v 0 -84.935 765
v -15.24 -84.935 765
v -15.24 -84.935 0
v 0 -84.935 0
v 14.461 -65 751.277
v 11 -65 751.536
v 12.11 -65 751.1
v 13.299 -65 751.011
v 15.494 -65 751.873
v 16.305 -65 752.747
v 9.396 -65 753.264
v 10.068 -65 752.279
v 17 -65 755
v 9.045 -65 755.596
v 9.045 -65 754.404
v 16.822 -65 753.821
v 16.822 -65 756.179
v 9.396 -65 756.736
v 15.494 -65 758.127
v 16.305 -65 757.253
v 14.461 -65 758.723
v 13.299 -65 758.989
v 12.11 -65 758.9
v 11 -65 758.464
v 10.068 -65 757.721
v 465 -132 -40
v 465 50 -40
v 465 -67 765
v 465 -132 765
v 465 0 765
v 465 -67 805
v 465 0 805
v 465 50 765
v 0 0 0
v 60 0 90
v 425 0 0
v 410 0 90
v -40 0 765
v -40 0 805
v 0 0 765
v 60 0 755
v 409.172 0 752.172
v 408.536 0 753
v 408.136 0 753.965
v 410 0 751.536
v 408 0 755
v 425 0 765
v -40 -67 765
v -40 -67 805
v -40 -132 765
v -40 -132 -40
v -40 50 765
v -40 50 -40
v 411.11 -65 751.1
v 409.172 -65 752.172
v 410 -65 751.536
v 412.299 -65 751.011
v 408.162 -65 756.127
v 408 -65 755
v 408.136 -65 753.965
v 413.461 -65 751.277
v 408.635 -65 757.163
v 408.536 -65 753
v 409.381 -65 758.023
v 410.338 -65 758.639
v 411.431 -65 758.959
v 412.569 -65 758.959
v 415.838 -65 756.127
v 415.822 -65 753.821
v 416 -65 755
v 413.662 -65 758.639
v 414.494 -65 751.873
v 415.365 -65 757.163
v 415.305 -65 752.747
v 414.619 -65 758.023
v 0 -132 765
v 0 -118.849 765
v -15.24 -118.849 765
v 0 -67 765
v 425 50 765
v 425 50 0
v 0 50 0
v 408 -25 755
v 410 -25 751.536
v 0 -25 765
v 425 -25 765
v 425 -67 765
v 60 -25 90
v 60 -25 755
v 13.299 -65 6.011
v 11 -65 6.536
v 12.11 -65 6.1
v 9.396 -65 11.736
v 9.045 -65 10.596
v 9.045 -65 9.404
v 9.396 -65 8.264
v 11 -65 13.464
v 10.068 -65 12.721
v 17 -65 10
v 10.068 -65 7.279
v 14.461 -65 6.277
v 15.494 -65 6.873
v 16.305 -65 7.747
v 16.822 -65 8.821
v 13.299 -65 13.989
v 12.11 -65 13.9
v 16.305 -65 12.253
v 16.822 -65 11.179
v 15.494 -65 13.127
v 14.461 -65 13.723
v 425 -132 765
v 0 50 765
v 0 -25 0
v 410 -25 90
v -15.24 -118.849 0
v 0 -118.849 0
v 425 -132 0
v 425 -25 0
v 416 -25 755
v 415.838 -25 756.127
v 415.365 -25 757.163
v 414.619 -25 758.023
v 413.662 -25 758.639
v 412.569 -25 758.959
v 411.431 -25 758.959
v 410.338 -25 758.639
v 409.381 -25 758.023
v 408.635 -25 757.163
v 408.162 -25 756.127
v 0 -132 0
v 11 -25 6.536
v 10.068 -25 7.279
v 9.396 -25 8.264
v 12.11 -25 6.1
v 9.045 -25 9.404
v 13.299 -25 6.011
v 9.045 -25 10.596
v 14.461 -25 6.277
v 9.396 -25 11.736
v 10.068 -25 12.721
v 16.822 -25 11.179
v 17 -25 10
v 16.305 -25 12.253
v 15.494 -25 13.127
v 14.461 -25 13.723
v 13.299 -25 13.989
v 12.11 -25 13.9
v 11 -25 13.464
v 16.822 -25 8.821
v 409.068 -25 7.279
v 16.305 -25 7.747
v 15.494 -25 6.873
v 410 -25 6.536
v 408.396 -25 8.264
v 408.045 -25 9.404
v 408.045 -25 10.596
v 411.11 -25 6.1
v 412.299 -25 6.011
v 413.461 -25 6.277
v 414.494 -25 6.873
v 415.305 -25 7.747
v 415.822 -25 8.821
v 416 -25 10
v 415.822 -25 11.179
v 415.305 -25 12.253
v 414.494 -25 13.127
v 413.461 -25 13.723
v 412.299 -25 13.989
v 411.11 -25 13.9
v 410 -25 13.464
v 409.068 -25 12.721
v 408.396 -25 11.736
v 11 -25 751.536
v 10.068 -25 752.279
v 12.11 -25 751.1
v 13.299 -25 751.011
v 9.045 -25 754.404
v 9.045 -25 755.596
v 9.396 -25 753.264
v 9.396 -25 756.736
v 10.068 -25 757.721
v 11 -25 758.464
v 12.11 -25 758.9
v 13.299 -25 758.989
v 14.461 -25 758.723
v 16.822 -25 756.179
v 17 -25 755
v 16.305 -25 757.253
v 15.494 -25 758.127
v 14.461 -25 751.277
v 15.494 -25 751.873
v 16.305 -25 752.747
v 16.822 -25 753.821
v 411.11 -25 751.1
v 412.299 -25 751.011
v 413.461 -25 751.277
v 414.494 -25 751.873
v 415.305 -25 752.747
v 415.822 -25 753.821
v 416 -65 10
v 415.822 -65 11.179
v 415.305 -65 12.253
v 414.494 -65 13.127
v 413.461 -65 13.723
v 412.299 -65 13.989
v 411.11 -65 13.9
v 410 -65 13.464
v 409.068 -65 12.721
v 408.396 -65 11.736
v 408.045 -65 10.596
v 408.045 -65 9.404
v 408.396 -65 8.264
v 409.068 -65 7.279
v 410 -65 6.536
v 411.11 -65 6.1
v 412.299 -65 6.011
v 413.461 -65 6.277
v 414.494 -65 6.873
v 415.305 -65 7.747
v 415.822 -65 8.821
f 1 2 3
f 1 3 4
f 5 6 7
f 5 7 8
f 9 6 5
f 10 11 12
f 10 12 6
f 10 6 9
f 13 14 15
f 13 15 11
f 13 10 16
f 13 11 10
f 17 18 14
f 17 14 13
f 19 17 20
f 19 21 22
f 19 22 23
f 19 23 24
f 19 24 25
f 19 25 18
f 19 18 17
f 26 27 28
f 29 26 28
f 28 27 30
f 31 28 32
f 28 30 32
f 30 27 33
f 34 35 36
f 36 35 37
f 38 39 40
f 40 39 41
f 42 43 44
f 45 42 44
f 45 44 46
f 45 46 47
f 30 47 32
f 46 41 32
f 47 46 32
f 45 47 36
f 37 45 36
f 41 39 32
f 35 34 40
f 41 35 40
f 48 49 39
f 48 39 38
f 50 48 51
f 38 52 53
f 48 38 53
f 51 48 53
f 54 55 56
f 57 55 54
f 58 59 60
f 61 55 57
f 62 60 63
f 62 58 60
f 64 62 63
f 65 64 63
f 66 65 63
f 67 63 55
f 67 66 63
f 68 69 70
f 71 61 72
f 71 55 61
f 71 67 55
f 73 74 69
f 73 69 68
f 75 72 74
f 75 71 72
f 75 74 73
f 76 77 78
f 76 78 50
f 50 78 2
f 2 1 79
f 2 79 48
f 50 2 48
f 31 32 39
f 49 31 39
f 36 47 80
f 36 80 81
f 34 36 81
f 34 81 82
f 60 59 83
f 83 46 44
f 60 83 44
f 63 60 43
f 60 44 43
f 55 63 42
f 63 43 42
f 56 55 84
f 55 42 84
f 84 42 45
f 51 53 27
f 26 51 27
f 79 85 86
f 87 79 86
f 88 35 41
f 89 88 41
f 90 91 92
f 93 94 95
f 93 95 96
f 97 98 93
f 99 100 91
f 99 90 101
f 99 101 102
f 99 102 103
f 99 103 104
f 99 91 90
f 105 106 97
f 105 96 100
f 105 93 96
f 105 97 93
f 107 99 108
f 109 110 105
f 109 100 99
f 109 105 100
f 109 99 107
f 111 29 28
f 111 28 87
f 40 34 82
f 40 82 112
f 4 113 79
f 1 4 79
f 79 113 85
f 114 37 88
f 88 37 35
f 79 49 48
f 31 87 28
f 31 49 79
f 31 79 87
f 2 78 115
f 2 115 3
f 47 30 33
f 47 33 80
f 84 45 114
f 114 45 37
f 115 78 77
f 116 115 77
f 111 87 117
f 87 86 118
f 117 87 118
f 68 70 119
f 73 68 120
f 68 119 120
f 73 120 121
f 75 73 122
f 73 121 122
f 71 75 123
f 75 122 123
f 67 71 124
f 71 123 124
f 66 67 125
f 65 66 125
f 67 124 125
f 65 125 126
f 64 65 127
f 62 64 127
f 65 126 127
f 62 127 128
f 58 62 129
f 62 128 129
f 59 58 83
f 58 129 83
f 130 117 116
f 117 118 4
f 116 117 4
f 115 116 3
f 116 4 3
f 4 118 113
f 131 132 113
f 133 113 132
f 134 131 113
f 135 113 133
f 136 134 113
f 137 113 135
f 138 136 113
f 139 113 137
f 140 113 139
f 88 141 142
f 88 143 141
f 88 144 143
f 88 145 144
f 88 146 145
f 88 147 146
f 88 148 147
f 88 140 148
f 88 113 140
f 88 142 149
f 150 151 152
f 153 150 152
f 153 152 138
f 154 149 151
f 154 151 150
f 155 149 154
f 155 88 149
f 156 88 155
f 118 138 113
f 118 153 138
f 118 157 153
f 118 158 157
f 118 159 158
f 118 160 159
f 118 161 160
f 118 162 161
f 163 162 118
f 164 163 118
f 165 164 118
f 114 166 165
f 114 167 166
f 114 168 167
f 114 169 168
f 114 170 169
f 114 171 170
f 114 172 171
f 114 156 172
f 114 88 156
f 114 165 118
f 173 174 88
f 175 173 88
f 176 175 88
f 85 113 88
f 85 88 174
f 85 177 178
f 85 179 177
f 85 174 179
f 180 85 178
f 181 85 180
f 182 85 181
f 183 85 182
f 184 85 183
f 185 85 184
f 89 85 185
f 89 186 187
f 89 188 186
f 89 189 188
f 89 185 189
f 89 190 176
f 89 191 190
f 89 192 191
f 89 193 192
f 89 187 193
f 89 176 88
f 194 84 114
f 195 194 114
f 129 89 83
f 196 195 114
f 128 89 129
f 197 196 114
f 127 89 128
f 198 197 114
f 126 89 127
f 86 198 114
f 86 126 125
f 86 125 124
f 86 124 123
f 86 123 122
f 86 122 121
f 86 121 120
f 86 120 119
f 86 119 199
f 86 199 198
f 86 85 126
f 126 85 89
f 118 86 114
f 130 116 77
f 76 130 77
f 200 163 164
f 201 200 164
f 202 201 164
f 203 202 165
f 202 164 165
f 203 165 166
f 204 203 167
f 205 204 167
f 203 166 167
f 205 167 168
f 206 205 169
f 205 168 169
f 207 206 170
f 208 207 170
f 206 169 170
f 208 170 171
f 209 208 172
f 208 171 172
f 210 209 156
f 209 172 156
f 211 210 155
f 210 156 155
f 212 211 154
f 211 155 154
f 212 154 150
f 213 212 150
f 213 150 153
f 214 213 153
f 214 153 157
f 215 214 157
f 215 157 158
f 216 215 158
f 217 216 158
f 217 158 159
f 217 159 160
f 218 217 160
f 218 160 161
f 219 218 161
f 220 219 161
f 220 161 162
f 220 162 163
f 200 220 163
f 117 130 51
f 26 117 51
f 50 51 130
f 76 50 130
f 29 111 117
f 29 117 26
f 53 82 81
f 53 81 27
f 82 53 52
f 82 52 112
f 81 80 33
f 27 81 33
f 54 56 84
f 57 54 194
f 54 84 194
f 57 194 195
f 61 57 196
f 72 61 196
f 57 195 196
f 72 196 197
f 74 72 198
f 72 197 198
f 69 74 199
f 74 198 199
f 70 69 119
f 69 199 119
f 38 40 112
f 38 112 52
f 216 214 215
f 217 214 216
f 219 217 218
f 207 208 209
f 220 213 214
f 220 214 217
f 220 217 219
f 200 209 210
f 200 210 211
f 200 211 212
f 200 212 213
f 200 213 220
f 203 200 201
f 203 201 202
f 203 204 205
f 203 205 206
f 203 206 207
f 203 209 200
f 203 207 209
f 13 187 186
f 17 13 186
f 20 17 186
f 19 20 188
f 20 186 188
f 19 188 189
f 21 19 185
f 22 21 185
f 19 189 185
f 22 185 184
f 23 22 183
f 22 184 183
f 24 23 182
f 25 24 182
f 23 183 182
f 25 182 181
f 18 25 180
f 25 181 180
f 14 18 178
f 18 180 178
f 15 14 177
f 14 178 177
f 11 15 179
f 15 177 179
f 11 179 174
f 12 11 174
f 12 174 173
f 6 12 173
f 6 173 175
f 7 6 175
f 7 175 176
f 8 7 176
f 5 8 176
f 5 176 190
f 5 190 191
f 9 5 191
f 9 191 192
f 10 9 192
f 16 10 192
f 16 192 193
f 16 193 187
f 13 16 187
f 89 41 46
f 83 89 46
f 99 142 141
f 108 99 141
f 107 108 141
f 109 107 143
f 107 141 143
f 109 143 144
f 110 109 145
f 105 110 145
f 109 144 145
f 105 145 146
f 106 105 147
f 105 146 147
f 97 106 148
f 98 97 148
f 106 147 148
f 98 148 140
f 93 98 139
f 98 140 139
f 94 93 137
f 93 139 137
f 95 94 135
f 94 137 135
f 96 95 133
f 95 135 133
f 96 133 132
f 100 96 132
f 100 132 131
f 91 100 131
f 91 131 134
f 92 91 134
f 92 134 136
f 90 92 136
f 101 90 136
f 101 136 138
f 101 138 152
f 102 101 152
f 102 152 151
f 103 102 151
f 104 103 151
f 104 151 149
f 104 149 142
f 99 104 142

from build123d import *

# Parameters (mm, degrees)
F0_W     = 425
F0_H     = 765
F0_R     = 4
F1_DEPTH = 25
F2_DEPTH = 65
F3_DEPTH = 65
F4_DEPTH = 50
F5_DEPTH = 67
F6_W     = 15.2404187247
F6_H     = 33.9140146971
F7_DEPTH = 765


with BuildPart() as f1:
    # F0 (on Front) → F1 (new body)
    with BuildSketch(Plane.XZ):
        Polygon((425, 0), (0, 0), (0, 765), (-40, 765), (-40, -40), (465, -40), (465, 765), (425, 765), align=None)
        with Locations((212.5, 382.5)):
            Rectangle(F0_W, F0_H)
        with Locations((13, 10)):
            Circle(F0_R, mode=Mode.SUBTRACT)
        with Locations((412, 10)):
            Circle(F0_R, mode=Mode.SUBTRACT)
        with Locations((13, 755)):
            Circle(F0_R, mode=Mode.SUBTRACT)
        with BuildLine():
            ThreePointArc((408, 755), (412, 759), (416, 755))
            ThreePointArc((416, 755), (414, 751.5358983849), (410, 751.5358983849))
            Line((410, 751.5358983849), (410, 90))
            Line((410, 90), (60, 90))
            Line((60, 90), (60, 755))
            Line((60, 755), (408, 755))
        make_face(mode=Mode.SUBTRACT)
    extrude(amount=F1_DEPTH)

    # F0 (on Front) → F2 (join)
    with BuildSketch(Plane.XZ):
        with BuildLine():
            Line((410, 755), (408, 755))
            ThreePointArc((408, 755), (408.5358983849, 753), (410, 751.5358983849))
            Line((410, 751.5358983849), (410, 755))
        make_face()
        with BuildLine():
            ThreePointArc((410, 751.5358983849), (414, 751.5358983849), (416, 755))
            ThreePointArc((416, 755), (412, 759), (408, 755))
            Line((408, 755), (410, 755))
            Line((410, 755), (410, 751.5358983849))
        make_face()
        with Locations((13, 755)):
            Circle(F0_R)
        with Locations((412, 10)):
            Circle(F0_R)
        with Locations((13, 10)):
            Circle(F0_R)
    extrude(amount=F2_DEPTH)

    # F0 (on Front) → F3 (join, through all)
    with BuildSketch(Plane.XZ):
        Polygon((425, 0), (0, 0), (0, 765), (-40, 765), (-40, -40), (465, -40), (465, 765), (425, 765), align=None)
    extrude(amount=F3_DEPTH)

    # F0 (on Front) → F4 (join)
    with BuildSketch(Plane.XZ):
        Polygon((425, 0), (0, 0), (0, 765), (-40, 765), (-40, -40), (465, -40), (465, 765), (425, 765), align=None)
    extrude(amount=-F4_DEPTH)

    # F0 (on Front) + F3_face (on face) → F5 (join)
    with BuildSketch(Plane.XZ):
        Polygon((425, 0), (0, 0), (0, 765), (-40, 765), (-40, -40), (465, -40), (465, 765), (425, 765), align=None)
        Polygon((-40, 765), (0, 765), (425, 765), (465, 765), (465, 805), (-40, 805), align=None)
    with BuildSketch(Plane(origin=(212.5, -65, 282.6167076167), x_dir=(1, 0, 0), z_dir=(0, -1, 0))):
        Polygon((212.5, -282.6167076167), (-212.5, -282.6167076167), (-212.5, 482.3832923833), (-252.5, 482.3832923833), (-252.5, -322.6167076167), (252.5, -322.6167076167), (252.5, 482.3832923833), (212.5, 482.3832923833), align=None)
    extrude(amount=F5_DEPTH)

    # F6 (on face) → F7 (cut, through all)
    with BuildSketch(Plane.XY.offset(765)):
        with Locations((-7.6202093624, -101.892054081)):
            Rectangle(F6_W, F6_H)
    extrude(amount=-F7_DEPTH, mode=Mode.SUBTRACT)


solid = f1.part
